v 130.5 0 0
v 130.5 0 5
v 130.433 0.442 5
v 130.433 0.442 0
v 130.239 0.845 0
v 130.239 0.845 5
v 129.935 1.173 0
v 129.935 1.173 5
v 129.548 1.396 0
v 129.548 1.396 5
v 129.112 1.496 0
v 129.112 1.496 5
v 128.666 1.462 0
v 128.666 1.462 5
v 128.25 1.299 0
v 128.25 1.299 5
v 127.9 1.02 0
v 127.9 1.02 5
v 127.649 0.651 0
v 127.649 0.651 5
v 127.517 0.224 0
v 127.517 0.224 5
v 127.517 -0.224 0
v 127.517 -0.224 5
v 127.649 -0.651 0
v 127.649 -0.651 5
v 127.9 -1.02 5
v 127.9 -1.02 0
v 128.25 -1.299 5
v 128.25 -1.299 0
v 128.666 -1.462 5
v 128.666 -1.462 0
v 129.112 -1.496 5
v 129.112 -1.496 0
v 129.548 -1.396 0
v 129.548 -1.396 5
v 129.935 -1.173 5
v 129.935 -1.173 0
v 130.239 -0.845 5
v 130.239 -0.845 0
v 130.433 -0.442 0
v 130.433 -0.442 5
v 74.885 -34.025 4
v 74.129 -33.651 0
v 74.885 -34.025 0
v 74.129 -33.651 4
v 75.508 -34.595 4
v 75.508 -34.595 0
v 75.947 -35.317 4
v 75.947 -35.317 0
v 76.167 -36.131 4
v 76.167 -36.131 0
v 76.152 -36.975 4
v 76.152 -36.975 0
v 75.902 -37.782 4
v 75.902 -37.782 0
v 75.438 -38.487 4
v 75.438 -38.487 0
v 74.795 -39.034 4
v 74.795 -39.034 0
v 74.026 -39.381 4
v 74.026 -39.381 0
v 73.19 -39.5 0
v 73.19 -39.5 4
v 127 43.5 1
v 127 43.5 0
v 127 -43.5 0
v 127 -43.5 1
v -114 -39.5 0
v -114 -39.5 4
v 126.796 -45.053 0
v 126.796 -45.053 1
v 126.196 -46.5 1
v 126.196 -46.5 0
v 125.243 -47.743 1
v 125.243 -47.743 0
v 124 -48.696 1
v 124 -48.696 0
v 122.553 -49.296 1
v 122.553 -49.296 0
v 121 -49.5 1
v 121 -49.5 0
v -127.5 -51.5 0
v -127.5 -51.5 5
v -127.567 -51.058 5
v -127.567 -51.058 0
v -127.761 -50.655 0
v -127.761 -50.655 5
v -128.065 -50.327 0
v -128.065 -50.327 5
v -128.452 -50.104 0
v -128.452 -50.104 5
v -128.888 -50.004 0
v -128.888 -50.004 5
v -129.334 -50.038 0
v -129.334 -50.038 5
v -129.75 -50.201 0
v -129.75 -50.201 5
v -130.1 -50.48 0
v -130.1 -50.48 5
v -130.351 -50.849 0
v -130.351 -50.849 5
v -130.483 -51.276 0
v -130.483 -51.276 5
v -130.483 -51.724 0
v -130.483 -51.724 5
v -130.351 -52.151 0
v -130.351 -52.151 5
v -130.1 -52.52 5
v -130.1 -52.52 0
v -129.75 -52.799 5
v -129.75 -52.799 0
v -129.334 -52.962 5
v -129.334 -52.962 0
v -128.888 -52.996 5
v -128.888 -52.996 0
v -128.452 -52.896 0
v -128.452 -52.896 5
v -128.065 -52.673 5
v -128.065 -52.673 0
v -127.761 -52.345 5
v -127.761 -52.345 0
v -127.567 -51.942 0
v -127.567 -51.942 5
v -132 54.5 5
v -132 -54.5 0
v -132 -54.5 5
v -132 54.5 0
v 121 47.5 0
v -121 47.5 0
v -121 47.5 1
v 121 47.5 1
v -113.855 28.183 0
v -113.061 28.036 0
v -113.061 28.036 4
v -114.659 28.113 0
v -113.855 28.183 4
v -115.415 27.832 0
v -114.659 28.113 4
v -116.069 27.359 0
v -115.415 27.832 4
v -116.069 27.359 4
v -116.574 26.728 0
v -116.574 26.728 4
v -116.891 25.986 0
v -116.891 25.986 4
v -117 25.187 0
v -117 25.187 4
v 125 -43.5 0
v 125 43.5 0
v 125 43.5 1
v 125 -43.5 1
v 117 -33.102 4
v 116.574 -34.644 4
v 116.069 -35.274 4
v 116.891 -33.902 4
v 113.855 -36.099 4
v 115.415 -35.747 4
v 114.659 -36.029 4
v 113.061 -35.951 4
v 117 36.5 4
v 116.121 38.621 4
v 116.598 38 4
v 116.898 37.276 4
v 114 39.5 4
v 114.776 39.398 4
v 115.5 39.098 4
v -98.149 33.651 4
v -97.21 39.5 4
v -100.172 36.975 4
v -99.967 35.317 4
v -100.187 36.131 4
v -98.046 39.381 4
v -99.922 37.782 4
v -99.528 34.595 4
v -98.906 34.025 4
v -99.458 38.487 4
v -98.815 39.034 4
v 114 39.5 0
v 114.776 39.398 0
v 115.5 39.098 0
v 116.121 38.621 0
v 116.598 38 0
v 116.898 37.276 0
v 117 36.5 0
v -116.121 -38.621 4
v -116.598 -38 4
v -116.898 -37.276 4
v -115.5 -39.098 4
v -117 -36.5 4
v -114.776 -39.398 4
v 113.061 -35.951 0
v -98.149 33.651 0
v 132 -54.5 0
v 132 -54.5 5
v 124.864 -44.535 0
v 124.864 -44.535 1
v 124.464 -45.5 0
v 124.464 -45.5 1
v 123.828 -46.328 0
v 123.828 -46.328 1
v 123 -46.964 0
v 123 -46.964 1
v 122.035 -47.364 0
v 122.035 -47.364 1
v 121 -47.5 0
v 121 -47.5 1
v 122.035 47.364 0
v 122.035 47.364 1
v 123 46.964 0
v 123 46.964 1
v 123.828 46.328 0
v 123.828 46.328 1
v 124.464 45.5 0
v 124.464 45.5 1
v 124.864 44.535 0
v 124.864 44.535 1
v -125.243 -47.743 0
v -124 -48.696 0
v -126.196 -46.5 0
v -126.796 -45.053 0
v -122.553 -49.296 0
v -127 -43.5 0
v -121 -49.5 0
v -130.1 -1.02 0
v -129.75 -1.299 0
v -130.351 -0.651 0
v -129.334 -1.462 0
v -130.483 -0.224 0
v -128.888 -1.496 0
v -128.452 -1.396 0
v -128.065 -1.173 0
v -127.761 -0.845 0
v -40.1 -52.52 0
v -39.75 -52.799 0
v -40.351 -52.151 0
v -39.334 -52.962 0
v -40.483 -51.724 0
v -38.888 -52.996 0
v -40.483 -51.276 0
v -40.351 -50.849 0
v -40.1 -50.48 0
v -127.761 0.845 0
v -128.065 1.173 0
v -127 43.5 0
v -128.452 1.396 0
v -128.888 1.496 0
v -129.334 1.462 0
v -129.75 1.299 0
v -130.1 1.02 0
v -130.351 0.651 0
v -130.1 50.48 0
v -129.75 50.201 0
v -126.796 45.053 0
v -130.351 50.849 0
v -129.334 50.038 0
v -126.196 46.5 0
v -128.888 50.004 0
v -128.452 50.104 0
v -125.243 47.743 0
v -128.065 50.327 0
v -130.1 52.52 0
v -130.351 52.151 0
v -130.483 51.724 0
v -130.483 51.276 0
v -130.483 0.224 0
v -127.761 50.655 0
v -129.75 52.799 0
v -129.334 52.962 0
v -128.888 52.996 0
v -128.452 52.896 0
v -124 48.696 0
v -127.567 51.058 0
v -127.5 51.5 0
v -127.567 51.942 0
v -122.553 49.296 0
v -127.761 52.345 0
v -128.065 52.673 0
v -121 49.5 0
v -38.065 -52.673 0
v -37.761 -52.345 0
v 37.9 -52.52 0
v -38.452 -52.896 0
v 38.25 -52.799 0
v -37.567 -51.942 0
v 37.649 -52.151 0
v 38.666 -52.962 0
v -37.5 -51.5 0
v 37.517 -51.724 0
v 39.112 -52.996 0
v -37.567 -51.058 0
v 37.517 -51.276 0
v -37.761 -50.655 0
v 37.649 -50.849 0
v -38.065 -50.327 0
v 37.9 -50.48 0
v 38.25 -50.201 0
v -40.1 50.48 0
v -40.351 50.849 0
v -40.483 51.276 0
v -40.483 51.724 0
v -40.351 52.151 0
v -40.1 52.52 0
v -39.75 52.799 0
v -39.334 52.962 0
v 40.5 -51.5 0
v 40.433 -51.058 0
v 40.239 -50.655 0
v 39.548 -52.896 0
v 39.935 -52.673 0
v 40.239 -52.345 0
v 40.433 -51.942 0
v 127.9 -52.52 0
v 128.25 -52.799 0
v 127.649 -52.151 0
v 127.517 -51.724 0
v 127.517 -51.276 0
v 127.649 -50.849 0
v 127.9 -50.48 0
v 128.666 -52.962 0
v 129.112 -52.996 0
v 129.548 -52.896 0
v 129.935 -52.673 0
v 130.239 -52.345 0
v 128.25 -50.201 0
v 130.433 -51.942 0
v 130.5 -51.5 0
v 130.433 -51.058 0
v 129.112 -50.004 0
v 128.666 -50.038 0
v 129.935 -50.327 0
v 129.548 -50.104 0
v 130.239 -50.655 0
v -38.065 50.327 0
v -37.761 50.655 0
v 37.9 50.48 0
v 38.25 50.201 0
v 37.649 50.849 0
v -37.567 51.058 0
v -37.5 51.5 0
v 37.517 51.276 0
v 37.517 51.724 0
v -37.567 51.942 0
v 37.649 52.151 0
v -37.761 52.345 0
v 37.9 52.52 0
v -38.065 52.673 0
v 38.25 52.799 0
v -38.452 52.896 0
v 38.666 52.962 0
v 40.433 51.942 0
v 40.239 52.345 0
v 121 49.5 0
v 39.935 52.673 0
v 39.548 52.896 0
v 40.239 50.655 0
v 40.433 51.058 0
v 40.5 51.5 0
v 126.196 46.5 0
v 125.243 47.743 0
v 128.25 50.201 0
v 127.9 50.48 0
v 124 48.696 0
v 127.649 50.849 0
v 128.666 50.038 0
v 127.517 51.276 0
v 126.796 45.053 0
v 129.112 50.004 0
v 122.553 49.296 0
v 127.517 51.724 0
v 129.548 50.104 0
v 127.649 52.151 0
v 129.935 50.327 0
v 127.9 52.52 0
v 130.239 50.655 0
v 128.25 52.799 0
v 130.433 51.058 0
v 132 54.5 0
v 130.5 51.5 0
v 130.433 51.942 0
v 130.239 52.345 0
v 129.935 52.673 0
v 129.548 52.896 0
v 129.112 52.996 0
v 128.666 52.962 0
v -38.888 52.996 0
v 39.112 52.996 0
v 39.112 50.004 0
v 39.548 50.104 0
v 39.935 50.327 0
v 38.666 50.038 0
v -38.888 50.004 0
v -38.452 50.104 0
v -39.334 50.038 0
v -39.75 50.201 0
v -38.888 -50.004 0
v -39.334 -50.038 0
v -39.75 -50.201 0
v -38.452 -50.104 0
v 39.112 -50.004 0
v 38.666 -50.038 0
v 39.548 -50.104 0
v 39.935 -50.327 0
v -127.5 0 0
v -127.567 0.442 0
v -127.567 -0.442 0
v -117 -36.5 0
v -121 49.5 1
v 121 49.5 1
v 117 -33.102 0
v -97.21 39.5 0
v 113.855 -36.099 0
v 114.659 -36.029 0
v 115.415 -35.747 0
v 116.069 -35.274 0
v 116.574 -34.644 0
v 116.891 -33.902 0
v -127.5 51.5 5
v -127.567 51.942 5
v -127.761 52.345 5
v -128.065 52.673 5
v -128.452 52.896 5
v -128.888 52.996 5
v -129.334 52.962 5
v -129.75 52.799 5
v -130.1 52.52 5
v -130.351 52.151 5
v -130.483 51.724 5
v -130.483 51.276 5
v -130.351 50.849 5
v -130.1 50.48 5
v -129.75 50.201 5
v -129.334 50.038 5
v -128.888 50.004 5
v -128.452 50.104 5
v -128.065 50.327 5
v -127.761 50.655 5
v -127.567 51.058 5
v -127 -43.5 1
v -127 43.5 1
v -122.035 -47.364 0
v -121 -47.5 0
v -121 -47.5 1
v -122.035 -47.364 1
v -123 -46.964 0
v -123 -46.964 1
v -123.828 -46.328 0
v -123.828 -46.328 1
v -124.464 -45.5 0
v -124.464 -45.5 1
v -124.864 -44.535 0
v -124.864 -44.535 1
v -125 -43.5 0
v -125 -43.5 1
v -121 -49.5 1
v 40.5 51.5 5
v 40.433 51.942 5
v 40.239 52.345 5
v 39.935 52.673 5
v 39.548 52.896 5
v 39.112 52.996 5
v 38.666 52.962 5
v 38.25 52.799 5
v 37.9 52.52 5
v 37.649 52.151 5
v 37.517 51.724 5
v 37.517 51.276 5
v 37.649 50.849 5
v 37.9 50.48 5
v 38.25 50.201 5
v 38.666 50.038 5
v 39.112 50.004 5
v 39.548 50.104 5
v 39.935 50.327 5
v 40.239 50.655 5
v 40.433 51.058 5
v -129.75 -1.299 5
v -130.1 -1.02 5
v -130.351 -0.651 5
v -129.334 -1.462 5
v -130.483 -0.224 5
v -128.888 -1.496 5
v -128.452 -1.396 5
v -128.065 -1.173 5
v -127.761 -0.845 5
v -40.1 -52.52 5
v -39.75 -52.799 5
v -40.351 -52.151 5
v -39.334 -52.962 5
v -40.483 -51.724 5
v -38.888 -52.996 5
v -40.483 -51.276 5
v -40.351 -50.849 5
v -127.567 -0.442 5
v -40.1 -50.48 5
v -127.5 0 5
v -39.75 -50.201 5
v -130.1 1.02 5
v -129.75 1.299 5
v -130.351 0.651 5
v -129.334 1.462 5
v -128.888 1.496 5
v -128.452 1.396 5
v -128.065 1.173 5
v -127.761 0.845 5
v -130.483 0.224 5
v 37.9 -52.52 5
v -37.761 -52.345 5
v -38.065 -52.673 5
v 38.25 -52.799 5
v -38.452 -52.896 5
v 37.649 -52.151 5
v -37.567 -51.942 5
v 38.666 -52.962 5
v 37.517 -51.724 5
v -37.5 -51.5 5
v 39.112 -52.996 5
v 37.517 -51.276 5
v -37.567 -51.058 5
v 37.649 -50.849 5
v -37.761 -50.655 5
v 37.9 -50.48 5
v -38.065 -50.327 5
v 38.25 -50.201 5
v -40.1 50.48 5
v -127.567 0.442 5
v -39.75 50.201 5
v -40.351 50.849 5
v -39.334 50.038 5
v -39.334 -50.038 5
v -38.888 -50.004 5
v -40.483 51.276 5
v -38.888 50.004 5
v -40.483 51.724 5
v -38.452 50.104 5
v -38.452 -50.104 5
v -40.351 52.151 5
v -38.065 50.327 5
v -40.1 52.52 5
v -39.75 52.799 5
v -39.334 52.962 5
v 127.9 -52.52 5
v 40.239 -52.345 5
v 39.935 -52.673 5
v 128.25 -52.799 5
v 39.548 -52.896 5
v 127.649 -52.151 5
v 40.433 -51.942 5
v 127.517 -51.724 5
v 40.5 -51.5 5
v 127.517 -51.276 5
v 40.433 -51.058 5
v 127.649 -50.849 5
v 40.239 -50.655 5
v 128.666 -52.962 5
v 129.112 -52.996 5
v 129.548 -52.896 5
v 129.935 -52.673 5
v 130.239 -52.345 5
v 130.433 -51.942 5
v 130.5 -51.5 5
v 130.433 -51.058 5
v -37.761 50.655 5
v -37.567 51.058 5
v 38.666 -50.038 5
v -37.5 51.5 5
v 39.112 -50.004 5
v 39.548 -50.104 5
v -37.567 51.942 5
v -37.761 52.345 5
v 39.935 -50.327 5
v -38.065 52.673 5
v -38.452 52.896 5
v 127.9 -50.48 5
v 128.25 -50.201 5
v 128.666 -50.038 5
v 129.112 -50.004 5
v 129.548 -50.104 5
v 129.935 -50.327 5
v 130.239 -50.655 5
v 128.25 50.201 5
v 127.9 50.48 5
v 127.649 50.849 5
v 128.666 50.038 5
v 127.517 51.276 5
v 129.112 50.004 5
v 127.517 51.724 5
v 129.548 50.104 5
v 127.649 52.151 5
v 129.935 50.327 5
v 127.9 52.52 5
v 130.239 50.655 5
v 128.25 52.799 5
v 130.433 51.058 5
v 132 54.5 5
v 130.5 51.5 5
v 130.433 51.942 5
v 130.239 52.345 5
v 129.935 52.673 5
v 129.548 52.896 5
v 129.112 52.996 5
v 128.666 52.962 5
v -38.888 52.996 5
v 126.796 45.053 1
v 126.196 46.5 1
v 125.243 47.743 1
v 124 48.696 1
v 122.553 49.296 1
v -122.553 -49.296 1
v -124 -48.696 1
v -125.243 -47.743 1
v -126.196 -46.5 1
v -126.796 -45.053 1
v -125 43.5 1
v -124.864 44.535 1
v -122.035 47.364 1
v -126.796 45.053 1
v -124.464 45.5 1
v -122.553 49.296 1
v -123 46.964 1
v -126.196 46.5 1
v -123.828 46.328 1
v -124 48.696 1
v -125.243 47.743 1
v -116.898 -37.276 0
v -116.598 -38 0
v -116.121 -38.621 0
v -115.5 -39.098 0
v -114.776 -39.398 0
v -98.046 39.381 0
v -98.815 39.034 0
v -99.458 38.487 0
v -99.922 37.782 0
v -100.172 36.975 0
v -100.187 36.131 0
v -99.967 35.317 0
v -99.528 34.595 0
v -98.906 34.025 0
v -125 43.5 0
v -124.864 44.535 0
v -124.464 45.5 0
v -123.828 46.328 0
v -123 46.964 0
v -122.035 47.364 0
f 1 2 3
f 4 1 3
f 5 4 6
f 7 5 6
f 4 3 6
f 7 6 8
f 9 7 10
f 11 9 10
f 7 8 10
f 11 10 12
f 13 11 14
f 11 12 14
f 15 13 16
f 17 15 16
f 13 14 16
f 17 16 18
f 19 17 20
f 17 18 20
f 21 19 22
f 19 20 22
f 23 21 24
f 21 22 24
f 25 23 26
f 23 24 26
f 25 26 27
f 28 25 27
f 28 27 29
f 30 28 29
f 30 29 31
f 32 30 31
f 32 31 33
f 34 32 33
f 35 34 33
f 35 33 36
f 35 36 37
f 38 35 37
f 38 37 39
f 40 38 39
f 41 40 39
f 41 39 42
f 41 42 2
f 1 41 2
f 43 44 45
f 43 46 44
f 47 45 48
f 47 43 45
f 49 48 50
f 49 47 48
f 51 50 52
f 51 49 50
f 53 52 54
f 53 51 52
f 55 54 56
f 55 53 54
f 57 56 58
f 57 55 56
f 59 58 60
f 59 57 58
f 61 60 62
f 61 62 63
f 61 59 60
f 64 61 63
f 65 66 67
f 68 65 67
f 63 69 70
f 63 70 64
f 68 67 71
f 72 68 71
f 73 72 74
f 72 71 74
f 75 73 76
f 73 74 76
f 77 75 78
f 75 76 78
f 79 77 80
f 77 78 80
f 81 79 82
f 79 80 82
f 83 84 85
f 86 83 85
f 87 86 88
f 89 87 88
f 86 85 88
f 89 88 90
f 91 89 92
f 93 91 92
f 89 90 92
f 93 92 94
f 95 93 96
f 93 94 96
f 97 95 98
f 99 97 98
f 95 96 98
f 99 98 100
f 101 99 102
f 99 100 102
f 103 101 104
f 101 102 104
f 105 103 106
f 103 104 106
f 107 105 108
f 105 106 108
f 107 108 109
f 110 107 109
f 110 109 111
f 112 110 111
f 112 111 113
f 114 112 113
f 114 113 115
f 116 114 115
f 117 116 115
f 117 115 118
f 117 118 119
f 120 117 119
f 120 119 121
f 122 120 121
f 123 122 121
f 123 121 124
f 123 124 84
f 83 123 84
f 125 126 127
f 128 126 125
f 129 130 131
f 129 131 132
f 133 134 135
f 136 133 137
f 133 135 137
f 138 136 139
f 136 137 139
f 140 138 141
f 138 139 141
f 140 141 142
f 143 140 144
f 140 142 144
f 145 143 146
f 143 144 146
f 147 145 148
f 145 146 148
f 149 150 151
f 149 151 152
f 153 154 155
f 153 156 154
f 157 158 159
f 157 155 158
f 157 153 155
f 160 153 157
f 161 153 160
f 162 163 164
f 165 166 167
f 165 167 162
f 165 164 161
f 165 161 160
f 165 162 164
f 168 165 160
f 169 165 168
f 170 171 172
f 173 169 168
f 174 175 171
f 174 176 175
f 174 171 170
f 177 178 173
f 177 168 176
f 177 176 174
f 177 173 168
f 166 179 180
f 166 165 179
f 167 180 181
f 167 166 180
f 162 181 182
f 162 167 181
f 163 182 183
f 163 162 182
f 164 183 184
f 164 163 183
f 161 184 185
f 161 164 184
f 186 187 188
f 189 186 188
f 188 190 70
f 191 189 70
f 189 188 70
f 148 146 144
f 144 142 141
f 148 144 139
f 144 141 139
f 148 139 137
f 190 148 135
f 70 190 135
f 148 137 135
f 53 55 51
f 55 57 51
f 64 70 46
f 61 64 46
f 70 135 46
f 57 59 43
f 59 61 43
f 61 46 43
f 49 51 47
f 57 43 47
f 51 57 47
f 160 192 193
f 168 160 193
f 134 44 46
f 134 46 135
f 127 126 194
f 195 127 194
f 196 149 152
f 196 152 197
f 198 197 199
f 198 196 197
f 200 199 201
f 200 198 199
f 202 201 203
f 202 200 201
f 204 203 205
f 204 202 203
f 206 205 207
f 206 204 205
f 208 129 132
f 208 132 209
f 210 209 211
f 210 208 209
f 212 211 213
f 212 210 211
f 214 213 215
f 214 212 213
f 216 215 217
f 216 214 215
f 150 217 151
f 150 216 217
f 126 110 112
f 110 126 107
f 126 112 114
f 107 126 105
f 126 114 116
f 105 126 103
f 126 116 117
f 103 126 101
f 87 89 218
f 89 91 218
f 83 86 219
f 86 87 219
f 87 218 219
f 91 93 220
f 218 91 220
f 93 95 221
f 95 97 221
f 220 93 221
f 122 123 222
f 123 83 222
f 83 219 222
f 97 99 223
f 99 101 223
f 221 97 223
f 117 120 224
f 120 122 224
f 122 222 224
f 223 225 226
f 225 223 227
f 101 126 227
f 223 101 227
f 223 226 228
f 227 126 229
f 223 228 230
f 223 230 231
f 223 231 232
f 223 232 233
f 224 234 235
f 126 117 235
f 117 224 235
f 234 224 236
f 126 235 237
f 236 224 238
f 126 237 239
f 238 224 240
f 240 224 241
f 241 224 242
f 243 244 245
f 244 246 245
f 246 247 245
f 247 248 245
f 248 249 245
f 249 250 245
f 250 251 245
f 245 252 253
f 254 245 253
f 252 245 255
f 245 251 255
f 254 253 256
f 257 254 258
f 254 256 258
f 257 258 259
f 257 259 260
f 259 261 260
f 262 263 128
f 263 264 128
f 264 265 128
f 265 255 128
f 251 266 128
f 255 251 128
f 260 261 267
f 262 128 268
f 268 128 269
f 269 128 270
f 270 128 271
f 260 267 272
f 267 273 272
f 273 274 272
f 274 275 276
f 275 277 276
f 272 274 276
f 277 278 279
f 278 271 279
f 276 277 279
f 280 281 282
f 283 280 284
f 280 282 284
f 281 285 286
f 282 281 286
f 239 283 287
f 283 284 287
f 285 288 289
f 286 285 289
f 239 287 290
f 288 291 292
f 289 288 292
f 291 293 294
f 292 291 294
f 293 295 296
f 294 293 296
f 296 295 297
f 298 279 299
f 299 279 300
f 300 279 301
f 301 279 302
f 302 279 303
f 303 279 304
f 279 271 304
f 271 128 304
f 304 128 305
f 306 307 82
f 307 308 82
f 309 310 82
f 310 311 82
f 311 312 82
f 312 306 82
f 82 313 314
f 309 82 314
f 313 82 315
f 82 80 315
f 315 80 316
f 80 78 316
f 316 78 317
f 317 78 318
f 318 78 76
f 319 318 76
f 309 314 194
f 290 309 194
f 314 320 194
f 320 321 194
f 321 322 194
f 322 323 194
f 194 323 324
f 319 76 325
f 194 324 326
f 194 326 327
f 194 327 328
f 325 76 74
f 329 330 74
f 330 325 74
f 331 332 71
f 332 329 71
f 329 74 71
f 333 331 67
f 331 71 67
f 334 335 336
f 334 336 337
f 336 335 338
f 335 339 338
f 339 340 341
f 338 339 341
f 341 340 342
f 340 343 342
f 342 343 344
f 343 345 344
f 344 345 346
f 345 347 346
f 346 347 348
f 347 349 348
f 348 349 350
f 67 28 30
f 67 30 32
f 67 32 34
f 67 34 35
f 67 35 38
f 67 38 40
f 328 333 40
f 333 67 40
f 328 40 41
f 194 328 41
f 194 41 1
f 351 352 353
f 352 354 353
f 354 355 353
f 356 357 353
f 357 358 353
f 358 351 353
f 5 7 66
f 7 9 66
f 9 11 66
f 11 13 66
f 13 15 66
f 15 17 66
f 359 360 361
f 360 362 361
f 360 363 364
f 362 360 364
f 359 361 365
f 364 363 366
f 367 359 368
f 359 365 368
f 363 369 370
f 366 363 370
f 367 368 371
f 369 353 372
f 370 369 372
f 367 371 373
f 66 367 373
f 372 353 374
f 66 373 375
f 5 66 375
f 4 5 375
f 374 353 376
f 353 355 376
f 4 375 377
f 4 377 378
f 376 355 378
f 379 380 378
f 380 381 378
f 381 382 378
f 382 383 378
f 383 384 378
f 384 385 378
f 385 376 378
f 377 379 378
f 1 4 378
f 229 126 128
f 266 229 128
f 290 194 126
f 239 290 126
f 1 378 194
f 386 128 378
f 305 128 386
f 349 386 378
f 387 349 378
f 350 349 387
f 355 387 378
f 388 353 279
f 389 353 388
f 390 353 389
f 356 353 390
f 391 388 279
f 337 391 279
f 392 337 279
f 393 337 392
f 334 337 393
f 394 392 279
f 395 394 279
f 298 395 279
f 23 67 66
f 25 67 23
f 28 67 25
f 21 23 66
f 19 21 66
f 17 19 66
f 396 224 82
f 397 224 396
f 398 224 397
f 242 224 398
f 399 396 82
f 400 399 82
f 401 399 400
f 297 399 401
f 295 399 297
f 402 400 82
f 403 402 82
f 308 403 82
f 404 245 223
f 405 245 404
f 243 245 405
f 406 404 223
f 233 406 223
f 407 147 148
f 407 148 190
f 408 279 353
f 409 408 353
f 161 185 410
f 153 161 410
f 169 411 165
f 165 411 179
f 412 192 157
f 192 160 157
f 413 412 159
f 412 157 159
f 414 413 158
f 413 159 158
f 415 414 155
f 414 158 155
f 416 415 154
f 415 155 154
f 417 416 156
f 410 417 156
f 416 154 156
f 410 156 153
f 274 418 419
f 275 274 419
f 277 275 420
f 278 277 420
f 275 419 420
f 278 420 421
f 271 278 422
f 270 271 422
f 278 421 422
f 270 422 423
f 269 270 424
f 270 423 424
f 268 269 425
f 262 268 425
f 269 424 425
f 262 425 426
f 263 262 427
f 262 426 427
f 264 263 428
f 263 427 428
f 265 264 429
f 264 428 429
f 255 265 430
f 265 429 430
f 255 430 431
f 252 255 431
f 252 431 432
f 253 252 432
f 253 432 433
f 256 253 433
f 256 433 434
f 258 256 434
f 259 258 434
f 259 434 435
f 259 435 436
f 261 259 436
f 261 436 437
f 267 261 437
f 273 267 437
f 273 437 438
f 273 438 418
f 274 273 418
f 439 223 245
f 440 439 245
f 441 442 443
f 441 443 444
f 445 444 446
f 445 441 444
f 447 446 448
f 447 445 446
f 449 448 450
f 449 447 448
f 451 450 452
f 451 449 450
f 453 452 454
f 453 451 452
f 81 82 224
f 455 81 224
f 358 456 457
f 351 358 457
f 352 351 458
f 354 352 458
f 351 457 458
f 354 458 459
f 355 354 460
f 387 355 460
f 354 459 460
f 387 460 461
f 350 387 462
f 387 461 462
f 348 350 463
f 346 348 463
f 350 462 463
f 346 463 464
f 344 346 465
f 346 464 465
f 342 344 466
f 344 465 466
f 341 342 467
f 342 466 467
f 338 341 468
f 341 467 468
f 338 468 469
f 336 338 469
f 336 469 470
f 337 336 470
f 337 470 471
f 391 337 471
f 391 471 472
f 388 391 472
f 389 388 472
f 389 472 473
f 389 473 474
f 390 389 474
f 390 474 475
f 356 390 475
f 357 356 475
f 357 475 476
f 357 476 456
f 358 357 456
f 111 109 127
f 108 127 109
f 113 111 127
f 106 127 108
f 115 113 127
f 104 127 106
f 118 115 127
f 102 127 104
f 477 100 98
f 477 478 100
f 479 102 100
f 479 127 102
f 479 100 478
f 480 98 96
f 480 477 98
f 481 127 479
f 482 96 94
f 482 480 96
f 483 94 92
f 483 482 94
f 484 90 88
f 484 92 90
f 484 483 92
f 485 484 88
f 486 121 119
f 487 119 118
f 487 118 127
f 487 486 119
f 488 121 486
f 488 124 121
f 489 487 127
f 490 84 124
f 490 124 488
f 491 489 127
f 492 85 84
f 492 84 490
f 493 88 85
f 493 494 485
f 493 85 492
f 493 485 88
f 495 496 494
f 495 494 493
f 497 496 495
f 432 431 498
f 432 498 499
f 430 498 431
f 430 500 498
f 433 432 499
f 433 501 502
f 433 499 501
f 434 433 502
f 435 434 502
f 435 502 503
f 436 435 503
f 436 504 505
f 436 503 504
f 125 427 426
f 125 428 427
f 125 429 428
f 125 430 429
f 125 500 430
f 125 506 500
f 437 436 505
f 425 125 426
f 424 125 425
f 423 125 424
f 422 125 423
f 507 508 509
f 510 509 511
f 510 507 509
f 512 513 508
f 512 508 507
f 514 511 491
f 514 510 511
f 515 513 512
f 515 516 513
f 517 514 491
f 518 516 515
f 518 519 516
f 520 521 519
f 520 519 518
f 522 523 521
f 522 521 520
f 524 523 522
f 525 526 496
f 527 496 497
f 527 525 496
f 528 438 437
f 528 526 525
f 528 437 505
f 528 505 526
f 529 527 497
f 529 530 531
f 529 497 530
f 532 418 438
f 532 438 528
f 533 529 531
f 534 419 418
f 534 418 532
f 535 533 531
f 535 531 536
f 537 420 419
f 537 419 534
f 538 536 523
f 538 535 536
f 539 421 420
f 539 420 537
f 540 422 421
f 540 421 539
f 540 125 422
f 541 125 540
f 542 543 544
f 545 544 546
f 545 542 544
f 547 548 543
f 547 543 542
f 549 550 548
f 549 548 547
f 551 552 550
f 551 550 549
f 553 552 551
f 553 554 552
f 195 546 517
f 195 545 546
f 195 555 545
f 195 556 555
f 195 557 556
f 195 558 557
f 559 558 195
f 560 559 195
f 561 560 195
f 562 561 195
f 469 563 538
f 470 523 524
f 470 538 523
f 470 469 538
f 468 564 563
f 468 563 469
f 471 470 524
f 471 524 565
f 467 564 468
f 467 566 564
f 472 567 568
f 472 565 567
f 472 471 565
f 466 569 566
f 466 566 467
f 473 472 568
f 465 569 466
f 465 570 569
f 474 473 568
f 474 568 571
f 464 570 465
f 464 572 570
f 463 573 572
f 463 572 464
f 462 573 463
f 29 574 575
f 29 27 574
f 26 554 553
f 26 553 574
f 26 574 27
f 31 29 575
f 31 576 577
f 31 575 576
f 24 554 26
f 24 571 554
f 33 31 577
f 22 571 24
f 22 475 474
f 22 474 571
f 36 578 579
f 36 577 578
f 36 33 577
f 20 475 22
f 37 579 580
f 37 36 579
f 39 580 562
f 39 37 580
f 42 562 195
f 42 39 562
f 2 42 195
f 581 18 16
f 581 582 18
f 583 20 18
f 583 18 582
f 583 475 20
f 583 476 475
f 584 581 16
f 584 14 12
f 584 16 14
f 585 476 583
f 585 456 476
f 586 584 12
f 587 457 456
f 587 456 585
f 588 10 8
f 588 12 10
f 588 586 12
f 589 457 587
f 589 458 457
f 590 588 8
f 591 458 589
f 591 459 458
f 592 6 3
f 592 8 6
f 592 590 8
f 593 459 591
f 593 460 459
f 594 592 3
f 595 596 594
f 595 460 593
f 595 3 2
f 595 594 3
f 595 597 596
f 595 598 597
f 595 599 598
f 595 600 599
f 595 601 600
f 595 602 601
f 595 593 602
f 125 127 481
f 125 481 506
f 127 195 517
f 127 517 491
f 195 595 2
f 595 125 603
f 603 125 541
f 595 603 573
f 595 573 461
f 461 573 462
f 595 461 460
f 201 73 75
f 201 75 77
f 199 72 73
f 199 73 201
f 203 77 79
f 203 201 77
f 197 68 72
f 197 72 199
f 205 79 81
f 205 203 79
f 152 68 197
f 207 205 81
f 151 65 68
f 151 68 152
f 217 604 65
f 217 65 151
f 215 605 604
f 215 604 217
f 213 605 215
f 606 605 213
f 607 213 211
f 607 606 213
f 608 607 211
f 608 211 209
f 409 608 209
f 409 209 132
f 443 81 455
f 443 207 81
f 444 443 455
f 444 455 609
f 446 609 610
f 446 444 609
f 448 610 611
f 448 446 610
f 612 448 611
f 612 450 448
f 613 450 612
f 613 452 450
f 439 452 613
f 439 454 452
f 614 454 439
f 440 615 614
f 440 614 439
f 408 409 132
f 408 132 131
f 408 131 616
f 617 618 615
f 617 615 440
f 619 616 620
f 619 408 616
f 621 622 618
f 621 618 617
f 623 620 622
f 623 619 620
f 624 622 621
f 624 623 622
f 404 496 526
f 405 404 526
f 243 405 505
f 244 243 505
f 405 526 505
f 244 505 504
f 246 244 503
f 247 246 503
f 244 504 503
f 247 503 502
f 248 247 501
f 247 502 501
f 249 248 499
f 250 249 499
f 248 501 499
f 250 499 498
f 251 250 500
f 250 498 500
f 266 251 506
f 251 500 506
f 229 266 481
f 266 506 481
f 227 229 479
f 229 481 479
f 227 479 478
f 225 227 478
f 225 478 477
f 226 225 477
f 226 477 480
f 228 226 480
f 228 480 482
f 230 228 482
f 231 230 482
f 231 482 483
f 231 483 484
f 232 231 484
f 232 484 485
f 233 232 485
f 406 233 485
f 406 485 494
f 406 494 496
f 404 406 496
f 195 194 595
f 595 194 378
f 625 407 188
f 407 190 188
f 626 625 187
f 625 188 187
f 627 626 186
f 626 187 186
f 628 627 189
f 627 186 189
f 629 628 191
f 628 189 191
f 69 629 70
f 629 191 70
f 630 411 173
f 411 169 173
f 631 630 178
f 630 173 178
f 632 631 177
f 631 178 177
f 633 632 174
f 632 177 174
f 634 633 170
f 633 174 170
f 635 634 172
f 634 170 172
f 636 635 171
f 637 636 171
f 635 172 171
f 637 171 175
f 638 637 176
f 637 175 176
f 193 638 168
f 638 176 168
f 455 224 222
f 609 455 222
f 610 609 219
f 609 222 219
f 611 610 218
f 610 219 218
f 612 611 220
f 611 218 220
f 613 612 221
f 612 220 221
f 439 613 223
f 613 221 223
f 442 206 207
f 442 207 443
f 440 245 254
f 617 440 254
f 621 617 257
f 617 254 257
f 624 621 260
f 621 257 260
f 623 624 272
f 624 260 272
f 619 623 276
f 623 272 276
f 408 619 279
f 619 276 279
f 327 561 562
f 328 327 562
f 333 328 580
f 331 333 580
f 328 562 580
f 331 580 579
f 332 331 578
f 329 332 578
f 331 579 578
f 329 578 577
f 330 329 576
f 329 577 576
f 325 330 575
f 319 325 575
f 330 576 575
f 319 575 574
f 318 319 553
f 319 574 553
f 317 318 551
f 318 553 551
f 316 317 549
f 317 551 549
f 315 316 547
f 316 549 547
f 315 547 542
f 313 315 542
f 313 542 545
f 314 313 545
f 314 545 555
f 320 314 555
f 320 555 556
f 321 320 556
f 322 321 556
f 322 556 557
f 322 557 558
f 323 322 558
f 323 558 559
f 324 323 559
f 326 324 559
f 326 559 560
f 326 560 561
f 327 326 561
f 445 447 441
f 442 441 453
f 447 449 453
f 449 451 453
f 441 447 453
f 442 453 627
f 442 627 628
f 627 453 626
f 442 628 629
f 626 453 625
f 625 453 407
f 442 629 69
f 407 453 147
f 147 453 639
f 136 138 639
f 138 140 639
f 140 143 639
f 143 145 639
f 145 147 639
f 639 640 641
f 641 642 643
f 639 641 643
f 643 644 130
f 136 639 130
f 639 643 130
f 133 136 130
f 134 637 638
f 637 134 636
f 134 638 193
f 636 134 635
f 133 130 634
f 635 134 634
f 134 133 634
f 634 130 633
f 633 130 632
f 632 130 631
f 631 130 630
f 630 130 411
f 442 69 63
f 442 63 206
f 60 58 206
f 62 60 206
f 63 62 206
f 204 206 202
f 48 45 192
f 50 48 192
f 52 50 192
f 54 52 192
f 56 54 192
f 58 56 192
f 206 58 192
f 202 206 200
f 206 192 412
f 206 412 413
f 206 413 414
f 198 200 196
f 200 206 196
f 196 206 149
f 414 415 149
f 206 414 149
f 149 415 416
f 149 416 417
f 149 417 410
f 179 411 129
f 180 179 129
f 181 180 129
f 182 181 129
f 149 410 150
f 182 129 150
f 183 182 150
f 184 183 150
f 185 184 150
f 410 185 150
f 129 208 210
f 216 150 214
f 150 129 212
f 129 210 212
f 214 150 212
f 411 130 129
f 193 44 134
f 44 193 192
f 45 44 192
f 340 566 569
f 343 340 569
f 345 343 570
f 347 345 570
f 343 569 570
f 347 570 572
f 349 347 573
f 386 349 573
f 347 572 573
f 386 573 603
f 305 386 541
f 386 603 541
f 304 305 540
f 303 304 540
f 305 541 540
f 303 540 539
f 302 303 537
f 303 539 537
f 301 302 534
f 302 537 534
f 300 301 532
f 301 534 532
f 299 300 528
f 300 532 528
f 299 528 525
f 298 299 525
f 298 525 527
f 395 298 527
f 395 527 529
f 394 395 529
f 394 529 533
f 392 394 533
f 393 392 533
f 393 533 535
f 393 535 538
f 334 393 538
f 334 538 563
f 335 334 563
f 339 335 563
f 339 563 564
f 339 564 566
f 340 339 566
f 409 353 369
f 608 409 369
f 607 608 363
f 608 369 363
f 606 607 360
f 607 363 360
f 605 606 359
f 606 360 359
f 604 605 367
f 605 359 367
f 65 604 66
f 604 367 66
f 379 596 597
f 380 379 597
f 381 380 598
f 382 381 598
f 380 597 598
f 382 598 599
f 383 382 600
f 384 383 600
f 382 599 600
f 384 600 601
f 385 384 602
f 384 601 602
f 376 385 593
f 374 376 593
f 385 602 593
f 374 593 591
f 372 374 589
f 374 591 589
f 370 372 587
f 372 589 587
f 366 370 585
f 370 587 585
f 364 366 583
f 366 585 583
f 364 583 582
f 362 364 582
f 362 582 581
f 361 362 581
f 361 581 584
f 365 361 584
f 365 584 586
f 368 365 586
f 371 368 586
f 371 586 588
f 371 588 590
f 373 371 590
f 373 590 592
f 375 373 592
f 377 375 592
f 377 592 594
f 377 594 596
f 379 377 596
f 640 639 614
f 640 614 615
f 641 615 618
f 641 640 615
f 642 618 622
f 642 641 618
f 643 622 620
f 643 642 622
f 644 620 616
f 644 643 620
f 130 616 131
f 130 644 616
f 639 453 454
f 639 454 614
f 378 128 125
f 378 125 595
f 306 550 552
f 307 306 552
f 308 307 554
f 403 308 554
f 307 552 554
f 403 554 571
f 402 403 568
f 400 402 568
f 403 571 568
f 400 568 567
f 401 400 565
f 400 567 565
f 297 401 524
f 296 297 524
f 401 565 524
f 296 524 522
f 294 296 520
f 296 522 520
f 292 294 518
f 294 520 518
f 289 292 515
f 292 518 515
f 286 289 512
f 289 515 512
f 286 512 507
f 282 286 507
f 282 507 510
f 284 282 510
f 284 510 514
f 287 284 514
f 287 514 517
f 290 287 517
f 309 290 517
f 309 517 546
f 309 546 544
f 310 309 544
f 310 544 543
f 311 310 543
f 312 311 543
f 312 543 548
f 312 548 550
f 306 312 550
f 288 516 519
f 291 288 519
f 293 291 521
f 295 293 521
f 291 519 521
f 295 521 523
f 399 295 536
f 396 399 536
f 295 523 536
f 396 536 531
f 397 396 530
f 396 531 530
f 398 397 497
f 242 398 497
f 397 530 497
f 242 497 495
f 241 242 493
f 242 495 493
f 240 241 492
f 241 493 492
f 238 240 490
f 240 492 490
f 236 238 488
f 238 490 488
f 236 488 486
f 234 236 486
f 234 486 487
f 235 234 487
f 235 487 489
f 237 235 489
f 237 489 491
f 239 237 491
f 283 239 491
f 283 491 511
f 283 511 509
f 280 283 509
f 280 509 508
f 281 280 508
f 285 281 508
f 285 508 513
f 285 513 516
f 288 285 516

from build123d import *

# Parameters (mm, degrees)
SKETCH1_W                 = 264
SKETCH1_H                 = 109
BOSS_EXTRUDE1_DEPTH       = 5
CUT_EXTRUDE1_DEPTH        = 1
CUT_EXTRUDE2_DEPTH        = 4
FILLET1_R                 = 3
F_3_0MM_DOWEL_HOLE1_D     = 3
F_3_0MM_DOWEL_HOLE1_DEPTH = 15
F_3_0MM_DOWEL_HOLE1_TIP   = 0.901290929


with BuildPart() as part:
    # Sketch1 → Boss-Extrude1 (new body)
    with BuildSketch(Plane.XY):
        Rectangle(SKETCH1_W, SKETCH1_H)
    extrude(amount=BOSS_EXTRUDE1_DEPTH)

    # Sketch2 → Cut-Extrude1 (cut)
    with BuildSketch(Plane(origin=(0, 0, 0), x_dir=(-1, 0, 0), z_dir=(0, 0, -1))):
        with BuildLine():
            Line((121, 49.5), (-121, 49.5))
            ThreePointArc((-121, 49.5), (-125.242640687, 47.742640687), (-127, 43.5))
            Line((-127, 43.5), (-127, -43.5))
            ThreePointArc((-127, -43.5), (-125.242640687, -47.742640687), (-121, -49.5))
            Line((-121, -49.5), (121, -49.5))
            ThreePointArc((121, -49.5), (125.242640687, -47.742640687), (127, -43.5))
            Line((127, -43.5), (127, 43.5))
            ThreePointArc((127, 43.5), (125.242640687, 47.742640687), (121, 49.5))
        make_face()
        with BuildLine():
            Line((121, 47.5), (-121, 47.5))
            ThreePointArc((-121, 47.5), (-123.828427125, 46.328427125), (-125, 43.5))
            Line((-125, 43.5), (-125, -43.5))
            ThreePointArc((-125, -43.5), (-123.828427125, -46.328427125), (-121, -47.5))
            Line((-121, -47.5), (121, -47.5))
            ThreePointArc((121, -47.5), (123.828427125, -46.328427125), (125, -43.5))
            Line((125, -43.5), (125, 43.5))
            ThreePointArc((125, 43.5), (123.828427125, 46.328427125), (121, 47.5))
        make_face(mode=Mode.SUBTRACT)
    extrude(amount=-CUT_EXTRUDE1_DEPTH, mode=Mode.SUBTRACT)

    # Sketch3 → Cut-Extrude2 (cut)
    with BuildSketch(Plane(origin=(0, 0, 0), x_dir=(-1, 0, 0), z_dir=(0, 0, -1))):
        Polygon((-117, 39.5), (-117, -37.249488302), (115.898875272, 39.5), align=None)
        Polygon((-91.878678072, -39.5), (117, 29.333873245), (117, -39.5), align=None)
    extrude(amount=-CUT_EXTRUDE2_DEPTH, mode=Mode.SUBTRACT)

    # Fillet1
    fillet1_edges = [part.edges().sort_by_distance(p)[0] for p in [
        (117, 39.5, 2),
        (-115.898875272, 39.5, 2),
        (117, -37.249488302, 2),
        (-117, -39.5, 2),
        (91.878678072, -39.5, 2),
        (-117, 29.333873245, 2),
    ]]
    fillet(fillet1_edges, radius=FILLET1_R)

    # Ø3.0mm Dowel Hole1
    with Locations(Plane(origin=(0, 0, 0), x_dir=(-1, 0, 0), z_dir=(0, 0, -1))):
        with Locations((-129, -51.5), (-129, 51.5), (129, 51.5), (129, -51.5), (-39, -51.5), (39, -51.5), (39, 51.5), (-39, 51.5), (129, 0), (-129, 0)):
            Hole(F_3_0MM_DOWEL_HOLE1_D / 2, depth=F_3_0MM_DOWEL_HOLE1_DEPTH)
            with Locations((0, 0, -(F_3_0MM_DOWEL_HOLE1_DEPTH + F_3_0MM_DOWEL_HOLE1_TIP / 2))):  # 118° drill point
                Cone(0, F_3_0MM_DOWEL_HOLE1_D / 2, F_3_0MM_DOWEL_HOLE1_TIP, mode=Mode.SUBTRACT)


solid = part.part
